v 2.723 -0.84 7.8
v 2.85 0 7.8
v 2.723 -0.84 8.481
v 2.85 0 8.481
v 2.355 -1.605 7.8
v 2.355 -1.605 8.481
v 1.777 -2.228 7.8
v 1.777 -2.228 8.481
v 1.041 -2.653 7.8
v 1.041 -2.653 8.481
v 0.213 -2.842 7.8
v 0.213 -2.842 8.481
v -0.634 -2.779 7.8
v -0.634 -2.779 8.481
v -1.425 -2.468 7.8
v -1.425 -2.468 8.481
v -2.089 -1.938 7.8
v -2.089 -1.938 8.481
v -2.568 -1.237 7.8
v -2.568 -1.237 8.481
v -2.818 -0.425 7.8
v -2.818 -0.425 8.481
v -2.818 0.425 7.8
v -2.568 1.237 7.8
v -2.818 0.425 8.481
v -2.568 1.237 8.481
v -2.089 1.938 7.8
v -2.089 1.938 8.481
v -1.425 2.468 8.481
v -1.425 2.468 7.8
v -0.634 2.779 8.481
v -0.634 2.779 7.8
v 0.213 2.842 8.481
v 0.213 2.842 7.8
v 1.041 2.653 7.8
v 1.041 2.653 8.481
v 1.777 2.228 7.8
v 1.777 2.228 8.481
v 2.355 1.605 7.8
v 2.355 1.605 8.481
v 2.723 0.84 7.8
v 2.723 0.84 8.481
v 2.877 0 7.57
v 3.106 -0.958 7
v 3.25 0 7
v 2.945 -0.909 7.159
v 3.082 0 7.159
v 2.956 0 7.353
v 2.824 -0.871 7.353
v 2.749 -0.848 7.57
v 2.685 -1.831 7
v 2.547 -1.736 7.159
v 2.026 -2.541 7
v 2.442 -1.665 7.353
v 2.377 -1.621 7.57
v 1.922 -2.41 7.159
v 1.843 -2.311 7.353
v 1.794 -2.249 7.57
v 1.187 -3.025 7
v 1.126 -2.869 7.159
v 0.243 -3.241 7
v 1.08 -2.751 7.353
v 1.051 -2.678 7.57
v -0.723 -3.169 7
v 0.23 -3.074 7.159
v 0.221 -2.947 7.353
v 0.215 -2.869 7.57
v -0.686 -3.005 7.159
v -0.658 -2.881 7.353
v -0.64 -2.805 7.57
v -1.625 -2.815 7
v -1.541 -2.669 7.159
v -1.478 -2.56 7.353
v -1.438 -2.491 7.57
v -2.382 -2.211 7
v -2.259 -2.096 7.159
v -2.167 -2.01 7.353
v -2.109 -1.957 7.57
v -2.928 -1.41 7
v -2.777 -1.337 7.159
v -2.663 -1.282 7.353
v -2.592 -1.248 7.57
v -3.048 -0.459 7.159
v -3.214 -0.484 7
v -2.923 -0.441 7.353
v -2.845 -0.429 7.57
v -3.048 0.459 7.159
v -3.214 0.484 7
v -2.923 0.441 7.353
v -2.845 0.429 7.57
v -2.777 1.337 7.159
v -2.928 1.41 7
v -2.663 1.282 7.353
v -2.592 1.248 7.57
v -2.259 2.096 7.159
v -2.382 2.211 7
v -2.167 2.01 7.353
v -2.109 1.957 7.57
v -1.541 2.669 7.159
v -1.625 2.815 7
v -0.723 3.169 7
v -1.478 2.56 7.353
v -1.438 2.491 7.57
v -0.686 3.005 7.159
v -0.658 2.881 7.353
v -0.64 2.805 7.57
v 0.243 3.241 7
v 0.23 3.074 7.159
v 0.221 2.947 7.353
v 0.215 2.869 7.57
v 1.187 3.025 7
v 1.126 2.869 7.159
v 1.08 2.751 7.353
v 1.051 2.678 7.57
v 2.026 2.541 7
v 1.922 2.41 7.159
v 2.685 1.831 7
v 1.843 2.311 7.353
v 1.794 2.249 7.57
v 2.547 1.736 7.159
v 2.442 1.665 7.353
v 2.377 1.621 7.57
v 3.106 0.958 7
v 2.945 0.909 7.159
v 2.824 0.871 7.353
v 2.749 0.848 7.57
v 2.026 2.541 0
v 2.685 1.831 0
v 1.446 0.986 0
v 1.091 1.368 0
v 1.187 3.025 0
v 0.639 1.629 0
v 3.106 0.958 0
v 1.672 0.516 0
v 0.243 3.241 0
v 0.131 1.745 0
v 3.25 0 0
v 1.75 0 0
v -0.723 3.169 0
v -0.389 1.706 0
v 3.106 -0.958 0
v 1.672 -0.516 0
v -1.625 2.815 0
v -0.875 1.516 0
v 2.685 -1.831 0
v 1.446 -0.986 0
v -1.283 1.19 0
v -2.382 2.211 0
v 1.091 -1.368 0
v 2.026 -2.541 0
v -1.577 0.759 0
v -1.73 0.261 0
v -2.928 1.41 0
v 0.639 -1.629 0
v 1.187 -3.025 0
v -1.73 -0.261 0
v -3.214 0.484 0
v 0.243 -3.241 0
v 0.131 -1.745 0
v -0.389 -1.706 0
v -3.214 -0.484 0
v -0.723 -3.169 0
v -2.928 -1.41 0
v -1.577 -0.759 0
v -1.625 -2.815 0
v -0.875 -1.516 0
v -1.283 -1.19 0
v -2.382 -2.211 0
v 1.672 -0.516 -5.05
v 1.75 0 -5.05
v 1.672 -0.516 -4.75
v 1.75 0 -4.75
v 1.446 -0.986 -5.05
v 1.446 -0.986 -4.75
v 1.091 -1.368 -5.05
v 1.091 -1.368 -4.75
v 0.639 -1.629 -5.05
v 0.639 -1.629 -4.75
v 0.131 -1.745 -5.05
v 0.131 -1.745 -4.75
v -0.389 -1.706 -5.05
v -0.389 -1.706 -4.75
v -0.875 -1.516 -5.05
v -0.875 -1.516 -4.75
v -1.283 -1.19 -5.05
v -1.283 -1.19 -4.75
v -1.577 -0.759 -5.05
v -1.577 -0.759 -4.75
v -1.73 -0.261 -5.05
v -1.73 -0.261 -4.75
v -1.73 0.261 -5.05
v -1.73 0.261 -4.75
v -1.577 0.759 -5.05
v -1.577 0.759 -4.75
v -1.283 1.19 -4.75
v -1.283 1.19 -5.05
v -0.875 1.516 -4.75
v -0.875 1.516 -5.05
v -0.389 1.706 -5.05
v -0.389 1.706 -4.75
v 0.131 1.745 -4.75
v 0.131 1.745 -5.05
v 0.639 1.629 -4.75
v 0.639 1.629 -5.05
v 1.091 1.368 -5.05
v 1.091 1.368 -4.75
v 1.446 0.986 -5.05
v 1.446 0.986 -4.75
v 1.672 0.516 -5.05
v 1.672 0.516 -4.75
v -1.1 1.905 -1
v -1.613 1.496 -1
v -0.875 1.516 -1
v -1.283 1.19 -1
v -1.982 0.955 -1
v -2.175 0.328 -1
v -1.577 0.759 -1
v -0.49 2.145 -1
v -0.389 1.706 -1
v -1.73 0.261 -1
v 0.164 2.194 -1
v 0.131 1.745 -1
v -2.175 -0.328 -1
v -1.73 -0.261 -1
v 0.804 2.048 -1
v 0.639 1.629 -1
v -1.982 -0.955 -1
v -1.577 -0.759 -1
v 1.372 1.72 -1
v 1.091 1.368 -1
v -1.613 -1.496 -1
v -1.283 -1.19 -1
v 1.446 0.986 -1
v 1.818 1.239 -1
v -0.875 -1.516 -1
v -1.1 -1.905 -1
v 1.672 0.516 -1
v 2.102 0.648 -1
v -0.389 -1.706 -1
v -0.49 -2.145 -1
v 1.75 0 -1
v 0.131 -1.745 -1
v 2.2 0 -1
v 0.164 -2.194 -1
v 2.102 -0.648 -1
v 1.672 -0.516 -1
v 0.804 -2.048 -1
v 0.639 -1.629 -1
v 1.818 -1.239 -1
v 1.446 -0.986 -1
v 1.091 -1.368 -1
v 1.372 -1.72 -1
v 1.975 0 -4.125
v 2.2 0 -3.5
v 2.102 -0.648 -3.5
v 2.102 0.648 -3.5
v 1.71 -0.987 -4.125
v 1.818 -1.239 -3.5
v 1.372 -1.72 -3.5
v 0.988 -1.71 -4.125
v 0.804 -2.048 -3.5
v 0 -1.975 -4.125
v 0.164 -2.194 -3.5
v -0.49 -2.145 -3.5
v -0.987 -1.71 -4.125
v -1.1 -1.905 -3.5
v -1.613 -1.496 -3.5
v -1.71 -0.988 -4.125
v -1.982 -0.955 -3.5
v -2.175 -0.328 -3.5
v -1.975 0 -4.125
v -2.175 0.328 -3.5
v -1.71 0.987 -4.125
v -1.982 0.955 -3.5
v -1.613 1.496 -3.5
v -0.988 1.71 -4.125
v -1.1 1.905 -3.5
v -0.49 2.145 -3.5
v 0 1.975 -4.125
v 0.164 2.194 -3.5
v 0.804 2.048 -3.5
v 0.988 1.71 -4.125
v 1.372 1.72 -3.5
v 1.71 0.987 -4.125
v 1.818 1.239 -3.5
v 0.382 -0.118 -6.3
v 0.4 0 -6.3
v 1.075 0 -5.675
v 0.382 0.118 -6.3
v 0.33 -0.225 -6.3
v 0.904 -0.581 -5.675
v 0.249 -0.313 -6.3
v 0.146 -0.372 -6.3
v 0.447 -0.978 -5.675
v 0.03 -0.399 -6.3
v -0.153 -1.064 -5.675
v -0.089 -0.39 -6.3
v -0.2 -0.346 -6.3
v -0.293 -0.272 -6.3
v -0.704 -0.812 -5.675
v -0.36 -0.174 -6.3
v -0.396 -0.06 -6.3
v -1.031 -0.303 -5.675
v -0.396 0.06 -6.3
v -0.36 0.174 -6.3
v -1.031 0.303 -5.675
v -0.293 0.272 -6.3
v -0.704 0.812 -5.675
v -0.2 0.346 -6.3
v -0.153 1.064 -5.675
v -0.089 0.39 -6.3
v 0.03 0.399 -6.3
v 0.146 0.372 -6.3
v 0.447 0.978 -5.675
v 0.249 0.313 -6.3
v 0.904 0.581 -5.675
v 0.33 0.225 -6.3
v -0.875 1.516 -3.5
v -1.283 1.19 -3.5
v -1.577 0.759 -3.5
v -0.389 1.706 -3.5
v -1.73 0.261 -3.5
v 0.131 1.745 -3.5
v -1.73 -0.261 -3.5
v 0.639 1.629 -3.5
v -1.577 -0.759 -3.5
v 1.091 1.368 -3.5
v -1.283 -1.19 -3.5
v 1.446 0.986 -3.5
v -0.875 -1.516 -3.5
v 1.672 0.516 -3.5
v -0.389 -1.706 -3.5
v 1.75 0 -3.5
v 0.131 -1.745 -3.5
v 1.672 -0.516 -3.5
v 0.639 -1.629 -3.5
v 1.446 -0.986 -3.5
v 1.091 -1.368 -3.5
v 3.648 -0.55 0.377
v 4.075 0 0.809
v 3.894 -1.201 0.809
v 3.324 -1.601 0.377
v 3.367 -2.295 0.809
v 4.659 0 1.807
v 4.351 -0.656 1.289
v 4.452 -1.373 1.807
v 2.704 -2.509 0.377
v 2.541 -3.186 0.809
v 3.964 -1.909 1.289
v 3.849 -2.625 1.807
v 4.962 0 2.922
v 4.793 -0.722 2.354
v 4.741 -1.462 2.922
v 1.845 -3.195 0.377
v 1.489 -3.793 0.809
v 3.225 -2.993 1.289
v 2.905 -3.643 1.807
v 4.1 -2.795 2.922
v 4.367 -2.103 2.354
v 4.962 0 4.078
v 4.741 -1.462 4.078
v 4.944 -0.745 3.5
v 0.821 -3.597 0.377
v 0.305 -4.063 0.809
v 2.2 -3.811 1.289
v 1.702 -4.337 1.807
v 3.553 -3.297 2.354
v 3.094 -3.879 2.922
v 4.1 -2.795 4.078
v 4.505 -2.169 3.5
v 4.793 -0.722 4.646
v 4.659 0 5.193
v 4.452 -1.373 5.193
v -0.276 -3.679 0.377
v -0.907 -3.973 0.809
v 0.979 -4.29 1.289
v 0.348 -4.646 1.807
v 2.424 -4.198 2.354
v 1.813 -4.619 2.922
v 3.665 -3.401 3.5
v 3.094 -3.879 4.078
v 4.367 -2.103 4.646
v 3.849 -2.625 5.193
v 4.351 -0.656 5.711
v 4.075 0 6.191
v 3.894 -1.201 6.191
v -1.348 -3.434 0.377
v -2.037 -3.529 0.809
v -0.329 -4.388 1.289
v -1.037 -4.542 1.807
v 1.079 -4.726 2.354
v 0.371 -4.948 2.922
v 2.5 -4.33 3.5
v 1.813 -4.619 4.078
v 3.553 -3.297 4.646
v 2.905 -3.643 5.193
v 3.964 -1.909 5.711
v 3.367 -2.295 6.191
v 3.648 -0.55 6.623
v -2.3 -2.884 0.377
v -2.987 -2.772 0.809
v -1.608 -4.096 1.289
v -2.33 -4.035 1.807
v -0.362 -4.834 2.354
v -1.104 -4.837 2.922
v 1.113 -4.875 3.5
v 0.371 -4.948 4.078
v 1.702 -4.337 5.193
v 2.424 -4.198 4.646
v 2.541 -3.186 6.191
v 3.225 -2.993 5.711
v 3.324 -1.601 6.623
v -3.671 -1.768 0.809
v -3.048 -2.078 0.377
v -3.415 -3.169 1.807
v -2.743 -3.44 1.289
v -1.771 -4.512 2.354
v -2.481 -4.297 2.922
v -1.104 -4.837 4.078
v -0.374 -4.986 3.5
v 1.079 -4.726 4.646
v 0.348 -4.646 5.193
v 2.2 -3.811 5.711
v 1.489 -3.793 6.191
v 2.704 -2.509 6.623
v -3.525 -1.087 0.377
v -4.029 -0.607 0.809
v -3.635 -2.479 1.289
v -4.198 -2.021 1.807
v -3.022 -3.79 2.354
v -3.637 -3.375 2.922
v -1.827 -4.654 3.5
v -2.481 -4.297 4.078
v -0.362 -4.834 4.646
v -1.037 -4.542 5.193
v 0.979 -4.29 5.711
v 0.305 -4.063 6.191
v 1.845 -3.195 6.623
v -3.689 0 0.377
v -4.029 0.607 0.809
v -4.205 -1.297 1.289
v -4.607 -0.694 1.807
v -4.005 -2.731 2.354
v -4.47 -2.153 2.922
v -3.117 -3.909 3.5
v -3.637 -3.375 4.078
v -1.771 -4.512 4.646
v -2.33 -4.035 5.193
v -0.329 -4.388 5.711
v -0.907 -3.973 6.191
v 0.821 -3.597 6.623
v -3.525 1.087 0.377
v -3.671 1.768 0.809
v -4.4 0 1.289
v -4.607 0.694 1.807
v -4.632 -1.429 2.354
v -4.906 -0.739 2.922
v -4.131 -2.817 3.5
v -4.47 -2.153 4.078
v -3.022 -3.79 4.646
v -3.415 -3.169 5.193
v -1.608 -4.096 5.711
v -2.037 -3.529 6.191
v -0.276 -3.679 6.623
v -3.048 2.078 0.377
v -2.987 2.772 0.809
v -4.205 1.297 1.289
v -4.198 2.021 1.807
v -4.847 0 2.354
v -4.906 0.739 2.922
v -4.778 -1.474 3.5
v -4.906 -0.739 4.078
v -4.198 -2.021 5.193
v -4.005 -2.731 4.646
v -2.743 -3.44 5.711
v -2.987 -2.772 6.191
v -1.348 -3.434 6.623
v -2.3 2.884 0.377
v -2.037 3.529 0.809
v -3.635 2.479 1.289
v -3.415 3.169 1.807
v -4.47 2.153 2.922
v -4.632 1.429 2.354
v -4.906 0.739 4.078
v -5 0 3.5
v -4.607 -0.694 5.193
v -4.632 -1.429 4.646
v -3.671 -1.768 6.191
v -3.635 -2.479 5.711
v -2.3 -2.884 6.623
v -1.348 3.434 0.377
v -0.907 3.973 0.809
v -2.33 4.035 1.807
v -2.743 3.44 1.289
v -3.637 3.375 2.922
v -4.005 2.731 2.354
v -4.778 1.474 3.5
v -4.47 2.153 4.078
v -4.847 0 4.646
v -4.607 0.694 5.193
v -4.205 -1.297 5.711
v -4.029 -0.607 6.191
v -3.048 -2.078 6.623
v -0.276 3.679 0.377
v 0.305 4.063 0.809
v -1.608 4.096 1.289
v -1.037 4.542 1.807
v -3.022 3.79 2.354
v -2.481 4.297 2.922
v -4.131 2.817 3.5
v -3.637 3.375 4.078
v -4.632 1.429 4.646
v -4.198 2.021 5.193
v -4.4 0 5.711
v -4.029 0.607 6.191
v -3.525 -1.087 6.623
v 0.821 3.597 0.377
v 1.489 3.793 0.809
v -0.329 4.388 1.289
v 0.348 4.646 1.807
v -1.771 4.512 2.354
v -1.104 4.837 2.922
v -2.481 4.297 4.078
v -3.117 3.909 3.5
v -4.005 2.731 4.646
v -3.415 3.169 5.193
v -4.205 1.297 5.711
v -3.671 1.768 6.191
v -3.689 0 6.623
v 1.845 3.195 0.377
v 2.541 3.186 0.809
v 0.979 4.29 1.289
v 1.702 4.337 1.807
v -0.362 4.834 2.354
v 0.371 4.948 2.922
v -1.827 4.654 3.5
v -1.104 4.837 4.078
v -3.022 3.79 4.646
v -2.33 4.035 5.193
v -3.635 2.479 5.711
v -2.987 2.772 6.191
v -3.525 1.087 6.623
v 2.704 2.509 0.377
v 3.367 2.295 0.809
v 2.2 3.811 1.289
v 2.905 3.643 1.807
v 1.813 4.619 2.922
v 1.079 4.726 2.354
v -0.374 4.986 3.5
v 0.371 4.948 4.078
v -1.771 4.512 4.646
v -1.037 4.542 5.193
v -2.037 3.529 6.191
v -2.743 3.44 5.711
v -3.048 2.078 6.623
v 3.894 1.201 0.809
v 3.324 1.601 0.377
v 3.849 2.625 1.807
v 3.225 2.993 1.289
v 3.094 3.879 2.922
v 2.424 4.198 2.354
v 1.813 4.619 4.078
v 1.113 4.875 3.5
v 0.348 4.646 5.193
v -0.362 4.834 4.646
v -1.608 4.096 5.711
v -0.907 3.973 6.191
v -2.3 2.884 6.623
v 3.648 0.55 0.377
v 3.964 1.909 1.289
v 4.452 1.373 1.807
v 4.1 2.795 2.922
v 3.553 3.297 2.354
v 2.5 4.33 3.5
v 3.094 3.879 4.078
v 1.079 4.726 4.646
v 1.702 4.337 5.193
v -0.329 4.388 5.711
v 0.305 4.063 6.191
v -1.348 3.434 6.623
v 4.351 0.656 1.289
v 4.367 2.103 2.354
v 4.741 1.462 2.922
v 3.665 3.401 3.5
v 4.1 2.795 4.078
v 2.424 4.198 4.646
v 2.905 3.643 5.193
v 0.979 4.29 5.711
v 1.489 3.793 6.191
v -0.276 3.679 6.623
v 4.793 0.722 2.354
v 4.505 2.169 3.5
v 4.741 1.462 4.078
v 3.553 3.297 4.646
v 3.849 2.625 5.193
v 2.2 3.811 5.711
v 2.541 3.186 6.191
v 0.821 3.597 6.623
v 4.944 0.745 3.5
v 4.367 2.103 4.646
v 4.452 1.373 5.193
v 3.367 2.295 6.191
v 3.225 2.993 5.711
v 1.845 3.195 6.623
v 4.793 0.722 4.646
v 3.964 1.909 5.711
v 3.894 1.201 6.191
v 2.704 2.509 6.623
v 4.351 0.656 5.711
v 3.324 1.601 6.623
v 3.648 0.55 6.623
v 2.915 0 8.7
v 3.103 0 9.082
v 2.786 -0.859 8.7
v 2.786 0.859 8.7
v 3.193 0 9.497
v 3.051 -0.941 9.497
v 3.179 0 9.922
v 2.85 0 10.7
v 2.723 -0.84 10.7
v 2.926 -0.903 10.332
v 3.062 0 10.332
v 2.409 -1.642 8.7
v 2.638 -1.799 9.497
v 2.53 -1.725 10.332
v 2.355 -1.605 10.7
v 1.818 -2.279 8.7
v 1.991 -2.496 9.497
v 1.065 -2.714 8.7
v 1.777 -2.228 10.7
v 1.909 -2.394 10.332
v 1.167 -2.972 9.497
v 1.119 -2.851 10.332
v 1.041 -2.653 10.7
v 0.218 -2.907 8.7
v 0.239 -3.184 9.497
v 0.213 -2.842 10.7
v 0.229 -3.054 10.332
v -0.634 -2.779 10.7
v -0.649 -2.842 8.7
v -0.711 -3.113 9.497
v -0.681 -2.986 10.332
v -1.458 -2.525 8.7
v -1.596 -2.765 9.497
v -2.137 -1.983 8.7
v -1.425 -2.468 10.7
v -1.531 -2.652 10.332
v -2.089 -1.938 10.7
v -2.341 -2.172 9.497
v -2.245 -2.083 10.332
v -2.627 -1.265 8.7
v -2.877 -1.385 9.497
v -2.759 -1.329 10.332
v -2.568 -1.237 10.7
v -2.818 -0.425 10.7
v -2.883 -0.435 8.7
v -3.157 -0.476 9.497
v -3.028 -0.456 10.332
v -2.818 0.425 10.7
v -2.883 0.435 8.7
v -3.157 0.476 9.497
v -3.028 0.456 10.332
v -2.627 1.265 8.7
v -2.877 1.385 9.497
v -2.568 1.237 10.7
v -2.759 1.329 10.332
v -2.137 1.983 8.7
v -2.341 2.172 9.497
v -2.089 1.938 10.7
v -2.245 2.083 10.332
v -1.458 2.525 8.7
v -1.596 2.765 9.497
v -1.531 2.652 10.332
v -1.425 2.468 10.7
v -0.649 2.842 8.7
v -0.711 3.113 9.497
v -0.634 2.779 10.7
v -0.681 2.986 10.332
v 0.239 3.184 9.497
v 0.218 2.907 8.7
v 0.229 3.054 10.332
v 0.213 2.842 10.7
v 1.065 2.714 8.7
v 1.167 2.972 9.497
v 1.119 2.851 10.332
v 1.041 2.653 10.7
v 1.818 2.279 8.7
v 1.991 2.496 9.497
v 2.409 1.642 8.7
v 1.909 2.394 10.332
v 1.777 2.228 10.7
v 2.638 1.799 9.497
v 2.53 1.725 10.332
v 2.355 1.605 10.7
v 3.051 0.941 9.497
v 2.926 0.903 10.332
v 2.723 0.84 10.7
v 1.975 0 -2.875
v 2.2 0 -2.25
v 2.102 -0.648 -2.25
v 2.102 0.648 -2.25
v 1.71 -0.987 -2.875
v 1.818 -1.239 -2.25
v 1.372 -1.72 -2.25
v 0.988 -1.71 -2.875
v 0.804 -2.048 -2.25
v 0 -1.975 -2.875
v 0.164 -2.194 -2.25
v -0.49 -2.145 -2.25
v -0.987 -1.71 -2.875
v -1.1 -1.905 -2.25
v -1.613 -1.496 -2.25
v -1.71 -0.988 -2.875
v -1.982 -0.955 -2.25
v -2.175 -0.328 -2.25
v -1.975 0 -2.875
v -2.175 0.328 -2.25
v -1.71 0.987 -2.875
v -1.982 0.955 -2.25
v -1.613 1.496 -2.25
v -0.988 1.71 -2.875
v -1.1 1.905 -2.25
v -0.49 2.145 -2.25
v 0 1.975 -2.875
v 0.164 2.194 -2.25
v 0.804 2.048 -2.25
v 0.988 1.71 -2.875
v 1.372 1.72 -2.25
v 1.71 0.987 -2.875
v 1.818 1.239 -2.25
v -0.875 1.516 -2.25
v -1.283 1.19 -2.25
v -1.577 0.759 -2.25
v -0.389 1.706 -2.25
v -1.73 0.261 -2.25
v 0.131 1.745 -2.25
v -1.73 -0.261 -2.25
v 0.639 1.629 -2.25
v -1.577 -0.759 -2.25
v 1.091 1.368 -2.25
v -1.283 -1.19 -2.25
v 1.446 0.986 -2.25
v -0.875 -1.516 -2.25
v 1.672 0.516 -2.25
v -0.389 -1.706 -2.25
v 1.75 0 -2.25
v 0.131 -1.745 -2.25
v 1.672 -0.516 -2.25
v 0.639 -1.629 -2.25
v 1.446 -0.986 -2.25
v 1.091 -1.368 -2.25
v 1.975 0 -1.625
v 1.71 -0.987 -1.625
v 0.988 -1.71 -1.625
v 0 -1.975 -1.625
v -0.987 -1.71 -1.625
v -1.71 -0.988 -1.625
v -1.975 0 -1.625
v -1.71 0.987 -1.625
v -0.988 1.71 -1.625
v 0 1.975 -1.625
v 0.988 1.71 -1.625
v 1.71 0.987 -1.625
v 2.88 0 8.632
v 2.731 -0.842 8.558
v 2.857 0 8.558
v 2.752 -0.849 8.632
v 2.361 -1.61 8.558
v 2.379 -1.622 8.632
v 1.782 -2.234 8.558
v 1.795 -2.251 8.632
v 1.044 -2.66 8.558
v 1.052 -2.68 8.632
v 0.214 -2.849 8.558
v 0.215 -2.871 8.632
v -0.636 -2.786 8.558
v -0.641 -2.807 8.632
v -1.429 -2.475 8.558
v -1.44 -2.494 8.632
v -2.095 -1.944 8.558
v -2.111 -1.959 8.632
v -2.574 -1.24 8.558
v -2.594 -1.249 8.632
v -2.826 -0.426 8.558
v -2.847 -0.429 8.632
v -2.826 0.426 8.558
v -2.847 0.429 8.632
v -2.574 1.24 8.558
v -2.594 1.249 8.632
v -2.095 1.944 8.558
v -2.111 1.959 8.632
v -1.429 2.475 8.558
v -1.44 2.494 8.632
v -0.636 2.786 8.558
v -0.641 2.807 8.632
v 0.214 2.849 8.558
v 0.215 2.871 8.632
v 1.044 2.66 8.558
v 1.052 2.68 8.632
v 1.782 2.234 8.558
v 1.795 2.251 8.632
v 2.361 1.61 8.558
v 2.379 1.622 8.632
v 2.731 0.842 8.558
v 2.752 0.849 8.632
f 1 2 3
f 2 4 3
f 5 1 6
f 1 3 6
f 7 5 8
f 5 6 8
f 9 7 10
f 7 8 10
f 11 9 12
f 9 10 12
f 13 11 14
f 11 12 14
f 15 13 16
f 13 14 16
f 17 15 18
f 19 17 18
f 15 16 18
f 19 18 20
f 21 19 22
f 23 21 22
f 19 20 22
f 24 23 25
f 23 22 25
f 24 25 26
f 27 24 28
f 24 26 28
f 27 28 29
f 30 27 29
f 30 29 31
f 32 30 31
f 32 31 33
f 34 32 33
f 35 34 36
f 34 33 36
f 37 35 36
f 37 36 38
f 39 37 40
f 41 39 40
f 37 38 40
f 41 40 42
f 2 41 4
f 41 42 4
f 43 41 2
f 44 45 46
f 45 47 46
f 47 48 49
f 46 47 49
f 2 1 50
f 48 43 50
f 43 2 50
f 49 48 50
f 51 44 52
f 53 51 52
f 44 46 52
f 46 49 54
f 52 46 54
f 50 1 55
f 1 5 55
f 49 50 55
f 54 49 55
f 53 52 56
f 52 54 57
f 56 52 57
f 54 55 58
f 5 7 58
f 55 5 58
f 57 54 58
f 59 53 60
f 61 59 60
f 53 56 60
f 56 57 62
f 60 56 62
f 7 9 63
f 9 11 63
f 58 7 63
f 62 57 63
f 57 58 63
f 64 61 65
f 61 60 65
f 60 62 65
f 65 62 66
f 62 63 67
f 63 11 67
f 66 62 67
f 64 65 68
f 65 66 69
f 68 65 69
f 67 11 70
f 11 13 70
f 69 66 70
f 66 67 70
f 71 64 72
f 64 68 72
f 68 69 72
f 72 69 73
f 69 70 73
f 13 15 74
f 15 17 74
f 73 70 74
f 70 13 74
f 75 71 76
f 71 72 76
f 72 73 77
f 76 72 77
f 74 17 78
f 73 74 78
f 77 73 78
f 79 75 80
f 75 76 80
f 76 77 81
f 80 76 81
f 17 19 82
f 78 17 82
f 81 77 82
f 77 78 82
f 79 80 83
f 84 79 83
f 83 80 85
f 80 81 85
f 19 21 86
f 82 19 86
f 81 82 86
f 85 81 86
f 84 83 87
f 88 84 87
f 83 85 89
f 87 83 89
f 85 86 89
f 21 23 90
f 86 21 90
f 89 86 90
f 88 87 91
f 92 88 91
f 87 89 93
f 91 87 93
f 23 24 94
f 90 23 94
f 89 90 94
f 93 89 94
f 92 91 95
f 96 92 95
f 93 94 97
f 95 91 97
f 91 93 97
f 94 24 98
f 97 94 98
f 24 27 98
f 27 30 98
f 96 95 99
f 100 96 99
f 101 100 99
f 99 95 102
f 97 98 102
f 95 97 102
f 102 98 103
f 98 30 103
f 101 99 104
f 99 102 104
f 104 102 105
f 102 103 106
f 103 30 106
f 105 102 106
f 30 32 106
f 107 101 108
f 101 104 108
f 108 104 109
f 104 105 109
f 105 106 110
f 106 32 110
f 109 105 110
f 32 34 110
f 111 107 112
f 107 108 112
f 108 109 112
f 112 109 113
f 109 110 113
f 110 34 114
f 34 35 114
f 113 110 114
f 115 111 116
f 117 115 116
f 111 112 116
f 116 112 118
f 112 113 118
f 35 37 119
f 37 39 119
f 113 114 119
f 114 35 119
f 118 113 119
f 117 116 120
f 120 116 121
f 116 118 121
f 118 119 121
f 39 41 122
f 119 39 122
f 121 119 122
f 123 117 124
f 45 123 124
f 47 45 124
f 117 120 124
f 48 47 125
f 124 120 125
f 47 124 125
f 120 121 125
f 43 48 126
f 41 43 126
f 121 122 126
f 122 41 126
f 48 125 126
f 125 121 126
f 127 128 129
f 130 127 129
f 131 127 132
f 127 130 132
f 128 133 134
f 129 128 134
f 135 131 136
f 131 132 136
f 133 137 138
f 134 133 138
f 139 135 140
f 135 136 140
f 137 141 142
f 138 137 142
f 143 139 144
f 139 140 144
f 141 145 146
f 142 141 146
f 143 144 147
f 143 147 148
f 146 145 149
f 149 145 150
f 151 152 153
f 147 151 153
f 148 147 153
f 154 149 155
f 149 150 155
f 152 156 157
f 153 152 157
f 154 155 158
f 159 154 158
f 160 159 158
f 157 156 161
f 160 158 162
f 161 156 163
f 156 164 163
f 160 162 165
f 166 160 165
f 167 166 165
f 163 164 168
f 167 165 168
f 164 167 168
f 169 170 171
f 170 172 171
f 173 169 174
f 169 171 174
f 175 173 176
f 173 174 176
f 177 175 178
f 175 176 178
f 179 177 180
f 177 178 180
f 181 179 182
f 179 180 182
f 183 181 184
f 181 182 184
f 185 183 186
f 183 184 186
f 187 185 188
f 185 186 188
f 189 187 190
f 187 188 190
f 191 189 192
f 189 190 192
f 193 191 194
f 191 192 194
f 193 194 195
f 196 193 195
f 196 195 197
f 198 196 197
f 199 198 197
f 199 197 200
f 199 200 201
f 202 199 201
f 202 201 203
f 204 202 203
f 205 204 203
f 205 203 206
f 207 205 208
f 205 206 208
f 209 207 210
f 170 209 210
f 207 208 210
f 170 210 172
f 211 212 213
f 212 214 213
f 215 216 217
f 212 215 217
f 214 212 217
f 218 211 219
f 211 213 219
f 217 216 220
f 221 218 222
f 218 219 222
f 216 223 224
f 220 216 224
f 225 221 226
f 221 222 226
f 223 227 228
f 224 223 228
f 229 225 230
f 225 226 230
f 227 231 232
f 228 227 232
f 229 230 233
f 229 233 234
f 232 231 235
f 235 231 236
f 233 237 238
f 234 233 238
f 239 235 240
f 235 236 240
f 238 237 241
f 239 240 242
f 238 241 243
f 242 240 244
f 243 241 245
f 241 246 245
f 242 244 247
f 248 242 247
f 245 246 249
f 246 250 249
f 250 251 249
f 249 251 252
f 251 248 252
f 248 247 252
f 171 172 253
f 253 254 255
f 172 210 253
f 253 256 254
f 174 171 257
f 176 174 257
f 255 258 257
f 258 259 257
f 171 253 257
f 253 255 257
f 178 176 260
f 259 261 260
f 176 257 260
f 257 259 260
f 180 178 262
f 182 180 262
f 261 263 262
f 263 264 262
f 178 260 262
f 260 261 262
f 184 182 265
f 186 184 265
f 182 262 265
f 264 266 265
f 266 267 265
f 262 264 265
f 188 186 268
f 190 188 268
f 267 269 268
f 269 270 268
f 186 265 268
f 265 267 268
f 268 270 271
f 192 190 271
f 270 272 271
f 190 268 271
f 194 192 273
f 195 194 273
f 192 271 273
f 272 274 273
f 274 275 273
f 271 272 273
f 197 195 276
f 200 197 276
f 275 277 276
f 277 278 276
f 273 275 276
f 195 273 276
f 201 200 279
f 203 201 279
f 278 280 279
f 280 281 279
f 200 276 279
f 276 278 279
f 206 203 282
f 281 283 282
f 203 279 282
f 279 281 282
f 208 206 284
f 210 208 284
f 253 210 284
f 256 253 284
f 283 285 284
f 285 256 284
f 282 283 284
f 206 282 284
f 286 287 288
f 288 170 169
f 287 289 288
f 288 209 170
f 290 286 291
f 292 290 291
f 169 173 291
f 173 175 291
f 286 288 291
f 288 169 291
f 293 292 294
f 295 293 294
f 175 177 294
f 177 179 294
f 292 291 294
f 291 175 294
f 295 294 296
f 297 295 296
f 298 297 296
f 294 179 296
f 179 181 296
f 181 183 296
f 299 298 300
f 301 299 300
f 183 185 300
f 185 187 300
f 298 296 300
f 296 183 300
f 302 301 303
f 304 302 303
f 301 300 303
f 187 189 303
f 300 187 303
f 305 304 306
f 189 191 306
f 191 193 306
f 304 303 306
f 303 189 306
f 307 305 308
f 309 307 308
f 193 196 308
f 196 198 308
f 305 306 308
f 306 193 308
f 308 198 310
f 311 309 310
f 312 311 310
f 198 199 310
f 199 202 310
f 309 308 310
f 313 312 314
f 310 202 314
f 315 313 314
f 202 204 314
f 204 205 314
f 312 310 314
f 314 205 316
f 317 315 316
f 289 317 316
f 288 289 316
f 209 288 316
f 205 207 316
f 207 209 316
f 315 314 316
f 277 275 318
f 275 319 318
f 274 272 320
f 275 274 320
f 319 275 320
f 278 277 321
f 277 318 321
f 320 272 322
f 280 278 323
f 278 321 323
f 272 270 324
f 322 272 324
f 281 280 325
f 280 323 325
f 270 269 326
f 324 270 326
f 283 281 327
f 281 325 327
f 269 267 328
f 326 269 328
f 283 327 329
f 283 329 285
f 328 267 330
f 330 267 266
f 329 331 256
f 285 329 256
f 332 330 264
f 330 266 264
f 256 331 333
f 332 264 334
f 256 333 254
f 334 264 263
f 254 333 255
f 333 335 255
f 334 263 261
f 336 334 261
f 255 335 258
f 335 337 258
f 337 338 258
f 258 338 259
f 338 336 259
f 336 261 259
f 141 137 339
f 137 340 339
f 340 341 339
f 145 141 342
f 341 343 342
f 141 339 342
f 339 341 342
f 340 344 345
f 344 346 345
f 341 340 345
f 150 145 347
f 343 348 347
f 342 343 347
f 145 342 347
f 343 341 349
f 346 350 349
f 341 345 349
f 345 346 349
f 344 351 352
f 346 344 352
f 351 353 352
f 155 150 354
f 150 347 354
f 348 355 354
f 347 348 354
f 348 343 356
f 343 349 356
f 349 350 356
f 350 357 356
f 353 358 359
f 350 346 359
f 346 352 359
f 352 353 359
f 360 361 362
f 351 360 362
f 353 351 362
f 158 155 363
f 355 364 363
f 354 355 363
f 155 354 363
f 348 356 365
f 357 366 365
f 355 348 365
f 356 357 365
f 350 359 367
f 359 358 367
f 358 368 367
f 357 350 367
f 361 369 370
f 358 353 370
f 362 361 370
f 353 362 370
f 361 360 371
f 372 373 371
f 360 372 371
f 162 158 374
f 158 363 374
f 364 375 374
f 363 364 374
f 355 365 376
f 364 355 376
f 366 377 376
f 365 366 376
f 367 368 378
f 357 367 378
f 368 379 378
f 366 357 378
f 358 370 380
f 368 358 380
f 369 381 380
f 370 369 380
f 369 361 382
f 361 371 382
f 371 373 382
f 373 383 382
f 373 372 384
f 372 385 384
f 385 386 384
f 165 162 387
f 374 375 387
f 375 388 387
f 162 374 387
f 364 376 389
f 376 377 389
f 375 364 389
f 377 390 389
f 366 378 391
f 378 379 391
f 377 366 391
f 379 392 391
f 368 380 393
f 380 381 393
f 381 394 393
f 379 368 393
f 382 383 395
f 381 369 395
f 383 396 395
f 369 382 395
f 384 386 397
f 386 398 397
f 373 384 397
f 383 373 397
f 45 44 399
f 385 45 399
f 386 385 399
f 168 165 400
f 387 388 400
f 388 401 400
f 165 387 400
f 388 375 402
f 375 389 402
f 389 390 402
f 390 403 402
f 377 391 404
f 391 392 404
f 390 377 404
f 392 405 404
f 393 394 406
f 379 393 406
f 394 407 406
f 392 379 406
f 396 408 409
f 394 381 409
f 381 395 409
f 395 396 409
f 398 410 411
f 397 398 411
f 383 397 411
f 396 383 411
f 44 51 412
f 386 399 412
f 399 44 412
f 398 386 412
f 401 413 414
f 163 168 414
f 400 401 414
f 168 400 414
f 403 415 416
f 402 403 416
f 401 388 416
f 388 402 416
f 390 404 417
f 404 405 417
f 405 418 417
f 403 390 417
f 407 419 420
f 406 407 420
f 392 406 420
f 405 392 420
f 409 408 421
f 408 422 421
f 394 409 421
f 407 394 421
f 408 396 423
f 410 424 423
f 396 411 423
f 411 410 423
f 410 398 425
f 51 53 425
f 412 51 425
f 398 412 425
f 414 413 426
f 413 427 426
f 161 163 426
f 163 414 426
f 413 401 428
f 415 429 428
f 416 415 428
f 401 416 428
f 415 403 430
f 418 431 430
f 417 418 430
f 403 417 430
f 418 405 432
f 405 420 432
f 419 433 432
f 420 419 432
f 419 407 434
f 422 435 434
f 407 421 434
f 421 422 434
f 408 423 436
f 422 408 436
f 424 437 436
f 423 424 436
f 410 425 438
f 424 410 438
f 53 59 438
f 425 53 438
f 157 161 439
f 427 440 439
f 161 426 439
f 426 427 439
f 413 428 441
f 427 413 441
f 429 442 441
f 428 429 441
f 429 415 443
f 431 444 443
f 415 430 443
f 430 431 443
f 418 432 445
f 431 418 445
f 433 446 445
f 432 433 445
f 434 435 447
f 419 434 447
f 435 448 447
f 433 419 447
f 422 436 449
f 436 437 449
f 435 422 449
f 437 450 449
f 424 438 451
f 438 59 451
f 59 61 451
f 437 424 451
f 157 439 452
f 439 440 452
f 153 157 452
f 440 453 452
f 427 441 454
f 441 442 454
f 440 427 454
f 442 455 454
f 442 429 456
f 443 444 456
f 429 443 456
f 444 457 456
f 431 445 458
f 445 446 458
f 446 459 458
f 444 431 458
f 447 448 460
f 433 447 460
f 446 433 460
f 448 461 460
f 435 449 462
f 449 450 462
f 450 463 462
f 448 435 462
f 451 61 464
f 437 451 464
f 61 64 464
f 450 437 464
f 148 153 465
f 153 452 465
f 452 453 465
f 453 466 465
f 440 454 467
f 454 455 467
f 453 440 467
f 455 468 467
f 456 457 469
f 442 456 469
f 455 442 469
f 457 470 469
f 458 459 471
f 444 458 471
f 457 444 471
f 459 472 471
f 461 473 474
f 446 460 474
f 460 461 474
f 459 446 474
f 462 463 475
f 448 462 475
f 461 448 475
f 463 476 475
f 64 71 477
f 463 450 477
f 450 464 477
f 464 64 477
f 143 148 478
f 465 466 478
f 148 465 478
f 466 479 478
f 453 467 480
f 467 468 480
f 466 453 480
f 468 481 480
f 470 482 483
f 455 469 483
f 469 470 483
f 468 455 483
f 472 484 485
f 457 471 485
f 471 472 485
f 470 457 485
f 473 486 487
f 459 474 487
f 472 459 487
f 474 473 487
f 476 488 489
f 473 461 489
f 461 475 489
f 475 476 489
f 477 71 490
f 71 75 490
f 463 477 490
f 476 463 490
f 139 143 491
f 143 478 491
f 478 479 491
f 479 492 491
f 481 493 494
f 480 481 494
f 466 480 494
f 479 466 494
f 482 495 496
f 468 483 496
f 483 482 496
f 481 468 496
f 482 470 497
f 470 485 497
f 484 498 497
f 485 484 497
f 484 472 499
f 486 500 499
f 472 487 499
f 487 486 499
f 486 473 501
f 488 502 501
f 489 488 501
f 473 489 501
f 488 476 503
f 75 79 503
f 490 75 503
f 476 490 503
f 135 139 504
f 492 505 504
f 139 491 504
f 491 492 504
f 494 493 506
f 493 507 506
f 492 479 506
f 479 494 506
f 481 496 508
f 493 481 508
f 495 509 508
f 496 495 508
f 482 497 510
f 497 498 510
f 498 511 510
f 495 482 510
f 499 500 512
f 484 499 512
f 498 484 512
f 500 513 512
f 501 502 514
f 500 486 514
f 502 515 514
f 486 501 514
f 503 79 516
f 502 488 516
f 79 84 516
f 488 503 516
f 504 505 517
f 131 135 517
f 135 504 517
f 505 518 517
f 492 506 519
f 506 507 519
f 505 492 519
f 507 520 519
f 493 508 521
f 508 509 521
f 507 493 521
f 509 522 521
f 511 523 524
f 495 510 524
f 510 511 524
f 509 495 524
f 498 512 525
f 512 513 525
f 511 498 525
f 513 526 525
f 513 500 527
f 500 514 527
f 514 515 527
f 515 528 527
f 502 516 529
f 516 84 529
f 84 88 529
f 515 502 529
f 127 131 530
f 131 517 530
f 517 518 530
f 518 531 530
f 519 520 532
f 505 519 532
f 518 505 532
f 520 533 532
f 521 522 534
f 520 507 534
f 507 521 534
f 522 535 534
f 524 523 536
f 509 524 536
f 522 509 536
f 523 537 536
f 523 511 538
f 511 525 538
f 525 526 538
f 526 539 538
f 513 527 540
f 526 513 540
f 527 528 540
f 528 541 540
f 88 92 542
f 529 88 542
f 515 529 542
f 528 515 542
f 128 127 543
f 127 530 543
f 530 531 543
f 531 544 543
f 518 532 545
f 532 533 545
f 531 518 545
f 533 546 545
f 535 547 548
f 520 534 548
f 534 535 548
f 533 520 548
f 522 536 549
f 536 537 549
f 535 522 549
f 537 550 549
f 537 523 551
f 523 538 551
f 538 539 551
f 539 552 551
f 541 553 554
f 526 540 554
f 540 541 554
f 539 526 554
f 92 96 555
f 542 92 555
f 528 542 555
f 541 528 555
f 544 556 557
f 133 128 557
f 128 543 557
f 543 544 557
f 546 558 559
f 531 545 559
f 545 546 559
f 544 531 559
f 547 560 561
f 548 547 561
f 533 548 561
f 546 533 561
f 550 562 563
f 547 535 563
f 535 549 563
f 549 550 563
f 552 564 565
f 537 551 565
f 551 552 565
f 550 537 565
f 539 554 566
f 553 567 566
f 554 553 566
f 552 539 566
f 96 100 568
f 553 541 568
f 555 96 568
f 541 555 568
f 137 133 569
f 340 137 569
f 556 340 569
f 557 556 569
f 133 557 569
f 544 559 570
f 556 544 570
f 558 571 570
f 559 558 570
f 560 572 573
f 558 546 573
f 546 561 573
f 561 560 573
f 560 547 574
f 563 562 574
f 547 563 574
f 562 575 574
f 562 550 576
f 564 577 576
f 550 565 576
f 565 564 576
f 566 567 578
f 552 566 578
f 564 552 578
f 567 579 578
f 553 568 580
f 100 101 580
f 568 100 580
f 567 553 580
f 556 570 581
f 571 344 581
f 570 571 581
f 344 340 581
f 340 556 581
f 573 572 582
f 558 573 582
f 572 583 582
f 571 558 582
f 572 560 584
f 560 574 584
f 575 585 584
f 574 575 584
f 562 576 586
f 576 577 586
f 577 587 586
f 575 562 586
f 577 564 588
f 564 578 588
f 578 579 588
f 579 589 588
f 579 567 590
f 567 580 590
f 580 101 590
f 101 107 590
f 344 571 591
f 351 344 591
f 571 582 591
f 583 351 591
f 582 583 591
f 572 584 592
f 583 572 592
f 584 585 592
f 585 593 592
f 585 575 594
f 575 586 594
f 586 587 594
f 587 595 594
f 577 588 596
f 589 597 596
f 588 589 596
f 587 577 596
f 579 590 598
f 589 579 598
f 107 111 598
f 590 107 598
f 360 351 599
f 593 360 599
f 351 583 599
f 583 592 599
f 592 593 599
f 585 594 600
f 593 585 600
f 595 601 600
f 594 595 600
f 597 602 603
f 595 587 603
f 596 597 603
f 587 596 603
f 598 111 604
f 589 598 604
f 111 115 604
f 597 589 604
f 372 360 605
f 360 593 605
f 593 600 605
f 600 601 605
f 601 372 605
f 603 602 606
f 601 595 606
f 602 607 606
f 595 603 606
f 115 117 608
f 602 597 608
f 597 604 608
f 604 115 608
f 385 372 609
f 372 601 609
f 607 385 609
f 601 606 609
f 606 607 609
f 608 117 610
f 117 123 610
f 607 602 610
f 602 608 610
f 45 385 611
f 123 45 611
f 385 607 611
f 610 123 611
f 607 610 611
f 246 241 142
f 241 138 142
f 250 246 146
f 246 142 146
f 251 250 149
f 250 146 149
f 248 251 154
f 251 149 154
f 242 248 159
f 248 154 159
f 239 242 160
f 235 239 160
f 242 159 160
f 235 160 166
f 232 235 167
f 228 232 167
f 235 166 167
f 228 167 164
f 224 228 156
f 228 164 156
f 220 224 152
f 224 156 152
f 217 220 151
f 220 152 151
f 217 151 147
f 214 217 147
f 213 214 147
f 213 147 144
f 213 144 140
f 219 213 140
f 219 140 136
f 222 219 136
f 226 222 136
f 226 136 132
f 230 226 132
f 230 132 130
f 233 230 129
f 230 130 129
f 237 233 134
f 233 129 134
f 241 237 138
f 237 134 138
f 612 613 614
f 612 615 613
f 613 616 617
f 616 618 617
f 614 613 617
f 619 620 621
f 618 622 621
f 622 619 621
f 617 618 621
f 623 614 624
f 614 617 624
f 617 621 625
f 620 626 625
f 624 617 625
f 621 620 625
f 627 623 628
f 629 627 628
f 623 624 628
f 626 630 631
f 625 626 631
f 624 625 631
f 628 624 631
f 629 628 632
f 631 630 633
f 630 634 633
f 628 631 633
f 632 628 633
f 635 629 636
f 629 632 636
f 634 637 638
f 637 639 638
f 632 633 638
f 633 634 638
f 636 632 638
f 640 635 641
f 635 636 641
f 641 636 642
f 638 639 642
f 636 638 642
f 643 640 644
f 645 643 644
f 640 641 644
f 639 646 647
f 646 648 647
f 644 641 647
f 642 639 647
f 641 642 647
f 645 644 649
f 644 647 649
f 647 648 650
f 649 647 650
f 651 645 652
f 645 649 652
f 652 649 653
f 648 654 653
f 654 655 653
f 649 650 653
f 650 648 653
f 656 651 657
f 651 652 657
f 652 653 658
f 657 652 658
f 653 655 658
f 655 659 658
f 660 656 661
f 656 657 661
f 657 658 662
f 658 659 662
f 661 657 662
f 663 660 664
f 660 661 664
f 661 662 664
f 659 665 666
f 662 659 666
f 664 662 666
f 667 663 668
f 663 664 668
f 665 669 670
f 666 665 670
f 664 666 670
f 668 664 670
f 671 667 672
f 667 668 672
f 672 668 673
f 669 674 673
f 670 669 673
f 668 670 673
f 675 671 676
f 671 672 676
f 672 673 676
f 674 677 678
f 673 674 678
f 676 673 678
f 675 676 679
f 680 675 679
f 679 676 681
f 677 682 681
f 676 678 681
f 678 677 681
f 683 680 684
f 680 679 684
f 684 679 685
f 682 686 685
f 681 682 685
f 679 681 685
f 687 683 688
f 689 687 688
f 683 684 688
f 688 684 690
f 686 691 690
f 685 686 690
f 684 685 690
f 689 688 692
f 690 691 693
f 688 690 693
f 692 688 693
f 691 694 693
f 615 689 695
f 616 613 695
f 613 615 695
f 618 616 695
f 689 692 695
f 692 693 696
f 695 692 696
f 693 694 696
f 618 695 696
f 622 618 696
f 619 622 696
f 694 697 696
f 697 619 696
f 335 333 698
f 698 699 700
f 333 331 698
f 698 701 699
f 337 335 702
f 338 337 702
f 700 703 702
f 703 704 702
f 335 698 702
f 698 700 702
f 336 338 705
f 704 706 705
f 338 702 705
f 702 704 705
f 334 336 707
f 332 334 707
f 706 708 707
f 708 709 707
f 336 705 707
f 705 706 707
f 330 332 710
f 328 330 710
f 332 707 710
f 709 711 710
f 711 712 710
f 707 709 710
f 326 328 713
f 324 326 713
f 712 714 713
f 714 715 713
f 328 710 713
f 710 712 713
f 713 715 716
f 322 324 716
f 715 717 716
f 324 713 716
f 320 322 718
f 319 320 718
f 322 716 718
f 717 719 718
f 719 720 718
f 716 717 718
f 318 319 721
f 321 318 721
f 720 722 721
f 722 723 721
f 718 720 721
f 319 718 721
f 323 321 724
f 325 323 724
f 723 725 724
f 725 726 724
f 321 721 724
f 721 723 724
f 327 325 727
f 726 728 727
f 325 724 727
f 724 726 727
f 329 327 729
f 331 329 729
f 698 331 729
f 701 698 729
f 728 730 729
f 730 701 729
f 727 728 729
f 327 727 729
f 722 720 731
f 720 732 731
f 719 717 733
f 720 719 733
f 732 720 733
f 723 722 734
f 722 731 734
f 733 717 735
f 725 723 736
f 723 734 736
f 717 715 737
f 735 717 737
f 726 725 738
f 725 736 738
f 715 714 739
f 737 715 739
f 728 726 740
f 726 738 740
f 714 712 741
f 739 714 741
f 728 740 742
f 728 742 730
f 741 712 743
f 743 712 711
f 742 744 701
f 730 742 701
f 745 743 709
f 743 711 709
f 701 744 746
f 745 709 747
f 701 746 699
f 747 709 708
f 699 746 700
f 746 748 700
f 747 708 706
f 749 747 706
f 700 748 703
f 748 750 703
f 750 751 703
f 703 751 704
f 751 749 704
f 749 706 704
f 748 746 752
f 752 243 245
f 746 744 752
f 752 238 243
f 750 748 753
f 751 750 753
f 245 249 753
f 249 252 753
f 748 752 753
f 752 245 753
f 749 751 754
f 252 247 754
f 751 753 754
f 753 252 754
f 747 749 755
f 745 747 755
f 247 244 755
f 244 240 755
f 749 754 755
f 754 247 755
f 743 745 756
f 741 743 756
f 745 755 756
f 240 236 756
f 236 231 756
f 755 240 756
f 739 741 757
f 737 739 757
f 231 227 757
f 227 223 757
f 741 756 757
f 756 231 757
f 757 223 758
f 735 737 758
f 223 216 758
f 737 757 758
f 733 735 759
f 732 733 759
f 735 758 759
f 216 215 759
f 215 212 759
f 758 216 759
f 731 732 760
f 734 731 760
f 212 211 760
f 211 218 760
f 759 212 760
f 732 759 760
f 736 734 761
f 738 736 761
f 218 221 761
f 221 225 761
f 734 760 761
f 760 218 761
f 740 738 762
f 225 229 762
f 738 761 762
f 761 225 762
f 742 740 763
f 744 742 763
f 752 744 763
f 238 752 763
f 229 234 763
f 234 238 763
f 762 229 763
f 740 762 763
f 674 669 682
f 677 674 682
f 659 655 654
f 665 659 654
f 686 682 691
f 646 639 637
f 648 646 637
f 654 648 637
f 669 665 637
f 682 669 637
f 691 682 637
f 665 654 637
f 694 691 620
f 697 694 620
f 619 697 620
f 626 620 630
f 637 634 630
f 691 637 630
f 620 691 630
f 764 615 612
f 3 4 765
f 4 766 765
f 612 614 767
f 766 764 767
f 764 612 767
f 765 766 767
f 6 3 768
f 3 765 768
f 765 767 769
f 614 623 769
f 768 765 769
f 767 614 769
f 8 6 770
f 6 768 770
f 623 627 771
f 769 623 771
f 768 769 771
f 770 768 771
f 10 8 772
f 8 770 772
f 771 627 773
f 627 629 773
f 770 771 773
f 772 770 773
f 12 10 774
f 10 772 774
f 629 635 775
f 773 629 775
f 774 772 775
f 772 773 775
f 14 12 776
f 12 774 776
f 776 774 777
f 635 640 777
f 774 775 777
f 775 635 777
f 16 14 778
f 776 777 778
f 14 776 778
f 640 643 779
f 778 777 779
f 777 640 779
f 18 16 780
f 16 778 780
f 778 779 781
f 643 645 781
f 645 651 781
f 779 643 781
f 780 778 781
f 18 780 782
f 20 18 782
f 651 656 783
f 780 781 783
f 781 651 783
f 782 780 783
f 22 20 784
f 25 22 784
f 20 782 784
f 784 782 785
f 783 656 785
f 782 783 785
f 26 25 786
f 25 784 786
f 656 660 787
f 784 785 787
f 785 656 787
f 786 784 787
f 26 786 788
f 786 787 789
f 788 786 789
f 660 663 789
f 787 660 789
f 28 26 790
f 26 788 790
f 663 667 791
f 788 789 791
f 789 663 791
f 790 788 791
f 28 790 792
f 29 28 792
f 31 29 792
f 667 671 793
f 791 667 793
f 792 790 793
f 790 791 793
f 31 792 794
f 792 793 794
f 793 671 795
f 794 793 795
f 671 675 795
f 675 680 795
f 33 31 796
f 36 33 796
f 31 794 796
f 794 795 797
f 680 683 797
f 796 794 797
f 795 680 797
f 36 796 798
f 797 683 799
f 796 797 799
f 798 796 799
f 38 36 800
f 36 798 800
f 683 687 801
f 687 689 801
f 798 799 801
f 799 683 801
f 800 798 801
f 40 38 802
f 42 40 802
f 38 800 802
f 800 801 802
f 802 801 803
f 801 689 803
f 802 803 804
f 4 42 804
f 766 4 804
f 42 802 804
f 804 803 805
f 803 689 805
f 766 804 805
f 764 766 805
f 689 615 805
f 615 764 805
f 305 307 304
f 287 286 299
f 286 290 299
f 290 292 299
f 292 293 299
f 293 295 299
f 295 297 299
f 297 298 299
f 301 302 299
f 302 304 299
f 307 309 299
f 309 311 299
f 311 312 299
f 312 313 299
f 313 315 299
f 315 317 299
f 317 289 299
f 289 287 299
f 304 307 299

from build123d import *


with BuildPart() as part:
    # Эскиз1 → Повернуть2 (revolve)
    with BuildSketch(Plane(origin=(0, 0, 0), x_dir=(1, 0, 0), z_dir=(0, 1, 0))):
        with BuildLine():
            Line((0, -10.7), (0, 6.3))
            Line((0, 6.3), (-0.4, 6.3))
            Line((-0.4, 6.3), (-1.75, 5.05))
            Line((-1.75, 5.05), (-1.75, 4.75))
            Line((-1.75, 4.75), (-2.2, 3.5))
            Line((-2.2, 3.5), (-1.75, 3.5))
            Line((-1.75, 3.5), (-2.2, 2.25))
            Line((-2.2, 2.25), (-1.75, 2.25))
            Line((-1.75, 2.25), (-2.2, 1))
            Line((-2.2, 1), (-1.75, 1))
            Line((-1.75, 1), (-1.75, 0))
            Line((-1.75, 0), (-3.25, 0))
            ThreePointArc((-3.25, 0), (-5, -3.5), (-3.25, -7))
            ThreePointArc((-3.25, -7), (-2.955572809, -7.352786405), (-2.85, -7.8))
            Line((-2.85, -7.8), (-2.85, -8.48076397))
            ThreePointArc((-2.85, -8.48076397), (-2.866706972, -8.595160014), (-2.915432274, -8.7))
            ThreePointArc((-2.915432274, -8.7), (-3.199069751, -9.710349868), (-2.85, -10.7))
            Line((-2.85, -10.7), (0, -10.7))
        make_face()
    revolve(axis=Axis((0, 0, -6.3), (0, 0, -1)))


solid = part.part
